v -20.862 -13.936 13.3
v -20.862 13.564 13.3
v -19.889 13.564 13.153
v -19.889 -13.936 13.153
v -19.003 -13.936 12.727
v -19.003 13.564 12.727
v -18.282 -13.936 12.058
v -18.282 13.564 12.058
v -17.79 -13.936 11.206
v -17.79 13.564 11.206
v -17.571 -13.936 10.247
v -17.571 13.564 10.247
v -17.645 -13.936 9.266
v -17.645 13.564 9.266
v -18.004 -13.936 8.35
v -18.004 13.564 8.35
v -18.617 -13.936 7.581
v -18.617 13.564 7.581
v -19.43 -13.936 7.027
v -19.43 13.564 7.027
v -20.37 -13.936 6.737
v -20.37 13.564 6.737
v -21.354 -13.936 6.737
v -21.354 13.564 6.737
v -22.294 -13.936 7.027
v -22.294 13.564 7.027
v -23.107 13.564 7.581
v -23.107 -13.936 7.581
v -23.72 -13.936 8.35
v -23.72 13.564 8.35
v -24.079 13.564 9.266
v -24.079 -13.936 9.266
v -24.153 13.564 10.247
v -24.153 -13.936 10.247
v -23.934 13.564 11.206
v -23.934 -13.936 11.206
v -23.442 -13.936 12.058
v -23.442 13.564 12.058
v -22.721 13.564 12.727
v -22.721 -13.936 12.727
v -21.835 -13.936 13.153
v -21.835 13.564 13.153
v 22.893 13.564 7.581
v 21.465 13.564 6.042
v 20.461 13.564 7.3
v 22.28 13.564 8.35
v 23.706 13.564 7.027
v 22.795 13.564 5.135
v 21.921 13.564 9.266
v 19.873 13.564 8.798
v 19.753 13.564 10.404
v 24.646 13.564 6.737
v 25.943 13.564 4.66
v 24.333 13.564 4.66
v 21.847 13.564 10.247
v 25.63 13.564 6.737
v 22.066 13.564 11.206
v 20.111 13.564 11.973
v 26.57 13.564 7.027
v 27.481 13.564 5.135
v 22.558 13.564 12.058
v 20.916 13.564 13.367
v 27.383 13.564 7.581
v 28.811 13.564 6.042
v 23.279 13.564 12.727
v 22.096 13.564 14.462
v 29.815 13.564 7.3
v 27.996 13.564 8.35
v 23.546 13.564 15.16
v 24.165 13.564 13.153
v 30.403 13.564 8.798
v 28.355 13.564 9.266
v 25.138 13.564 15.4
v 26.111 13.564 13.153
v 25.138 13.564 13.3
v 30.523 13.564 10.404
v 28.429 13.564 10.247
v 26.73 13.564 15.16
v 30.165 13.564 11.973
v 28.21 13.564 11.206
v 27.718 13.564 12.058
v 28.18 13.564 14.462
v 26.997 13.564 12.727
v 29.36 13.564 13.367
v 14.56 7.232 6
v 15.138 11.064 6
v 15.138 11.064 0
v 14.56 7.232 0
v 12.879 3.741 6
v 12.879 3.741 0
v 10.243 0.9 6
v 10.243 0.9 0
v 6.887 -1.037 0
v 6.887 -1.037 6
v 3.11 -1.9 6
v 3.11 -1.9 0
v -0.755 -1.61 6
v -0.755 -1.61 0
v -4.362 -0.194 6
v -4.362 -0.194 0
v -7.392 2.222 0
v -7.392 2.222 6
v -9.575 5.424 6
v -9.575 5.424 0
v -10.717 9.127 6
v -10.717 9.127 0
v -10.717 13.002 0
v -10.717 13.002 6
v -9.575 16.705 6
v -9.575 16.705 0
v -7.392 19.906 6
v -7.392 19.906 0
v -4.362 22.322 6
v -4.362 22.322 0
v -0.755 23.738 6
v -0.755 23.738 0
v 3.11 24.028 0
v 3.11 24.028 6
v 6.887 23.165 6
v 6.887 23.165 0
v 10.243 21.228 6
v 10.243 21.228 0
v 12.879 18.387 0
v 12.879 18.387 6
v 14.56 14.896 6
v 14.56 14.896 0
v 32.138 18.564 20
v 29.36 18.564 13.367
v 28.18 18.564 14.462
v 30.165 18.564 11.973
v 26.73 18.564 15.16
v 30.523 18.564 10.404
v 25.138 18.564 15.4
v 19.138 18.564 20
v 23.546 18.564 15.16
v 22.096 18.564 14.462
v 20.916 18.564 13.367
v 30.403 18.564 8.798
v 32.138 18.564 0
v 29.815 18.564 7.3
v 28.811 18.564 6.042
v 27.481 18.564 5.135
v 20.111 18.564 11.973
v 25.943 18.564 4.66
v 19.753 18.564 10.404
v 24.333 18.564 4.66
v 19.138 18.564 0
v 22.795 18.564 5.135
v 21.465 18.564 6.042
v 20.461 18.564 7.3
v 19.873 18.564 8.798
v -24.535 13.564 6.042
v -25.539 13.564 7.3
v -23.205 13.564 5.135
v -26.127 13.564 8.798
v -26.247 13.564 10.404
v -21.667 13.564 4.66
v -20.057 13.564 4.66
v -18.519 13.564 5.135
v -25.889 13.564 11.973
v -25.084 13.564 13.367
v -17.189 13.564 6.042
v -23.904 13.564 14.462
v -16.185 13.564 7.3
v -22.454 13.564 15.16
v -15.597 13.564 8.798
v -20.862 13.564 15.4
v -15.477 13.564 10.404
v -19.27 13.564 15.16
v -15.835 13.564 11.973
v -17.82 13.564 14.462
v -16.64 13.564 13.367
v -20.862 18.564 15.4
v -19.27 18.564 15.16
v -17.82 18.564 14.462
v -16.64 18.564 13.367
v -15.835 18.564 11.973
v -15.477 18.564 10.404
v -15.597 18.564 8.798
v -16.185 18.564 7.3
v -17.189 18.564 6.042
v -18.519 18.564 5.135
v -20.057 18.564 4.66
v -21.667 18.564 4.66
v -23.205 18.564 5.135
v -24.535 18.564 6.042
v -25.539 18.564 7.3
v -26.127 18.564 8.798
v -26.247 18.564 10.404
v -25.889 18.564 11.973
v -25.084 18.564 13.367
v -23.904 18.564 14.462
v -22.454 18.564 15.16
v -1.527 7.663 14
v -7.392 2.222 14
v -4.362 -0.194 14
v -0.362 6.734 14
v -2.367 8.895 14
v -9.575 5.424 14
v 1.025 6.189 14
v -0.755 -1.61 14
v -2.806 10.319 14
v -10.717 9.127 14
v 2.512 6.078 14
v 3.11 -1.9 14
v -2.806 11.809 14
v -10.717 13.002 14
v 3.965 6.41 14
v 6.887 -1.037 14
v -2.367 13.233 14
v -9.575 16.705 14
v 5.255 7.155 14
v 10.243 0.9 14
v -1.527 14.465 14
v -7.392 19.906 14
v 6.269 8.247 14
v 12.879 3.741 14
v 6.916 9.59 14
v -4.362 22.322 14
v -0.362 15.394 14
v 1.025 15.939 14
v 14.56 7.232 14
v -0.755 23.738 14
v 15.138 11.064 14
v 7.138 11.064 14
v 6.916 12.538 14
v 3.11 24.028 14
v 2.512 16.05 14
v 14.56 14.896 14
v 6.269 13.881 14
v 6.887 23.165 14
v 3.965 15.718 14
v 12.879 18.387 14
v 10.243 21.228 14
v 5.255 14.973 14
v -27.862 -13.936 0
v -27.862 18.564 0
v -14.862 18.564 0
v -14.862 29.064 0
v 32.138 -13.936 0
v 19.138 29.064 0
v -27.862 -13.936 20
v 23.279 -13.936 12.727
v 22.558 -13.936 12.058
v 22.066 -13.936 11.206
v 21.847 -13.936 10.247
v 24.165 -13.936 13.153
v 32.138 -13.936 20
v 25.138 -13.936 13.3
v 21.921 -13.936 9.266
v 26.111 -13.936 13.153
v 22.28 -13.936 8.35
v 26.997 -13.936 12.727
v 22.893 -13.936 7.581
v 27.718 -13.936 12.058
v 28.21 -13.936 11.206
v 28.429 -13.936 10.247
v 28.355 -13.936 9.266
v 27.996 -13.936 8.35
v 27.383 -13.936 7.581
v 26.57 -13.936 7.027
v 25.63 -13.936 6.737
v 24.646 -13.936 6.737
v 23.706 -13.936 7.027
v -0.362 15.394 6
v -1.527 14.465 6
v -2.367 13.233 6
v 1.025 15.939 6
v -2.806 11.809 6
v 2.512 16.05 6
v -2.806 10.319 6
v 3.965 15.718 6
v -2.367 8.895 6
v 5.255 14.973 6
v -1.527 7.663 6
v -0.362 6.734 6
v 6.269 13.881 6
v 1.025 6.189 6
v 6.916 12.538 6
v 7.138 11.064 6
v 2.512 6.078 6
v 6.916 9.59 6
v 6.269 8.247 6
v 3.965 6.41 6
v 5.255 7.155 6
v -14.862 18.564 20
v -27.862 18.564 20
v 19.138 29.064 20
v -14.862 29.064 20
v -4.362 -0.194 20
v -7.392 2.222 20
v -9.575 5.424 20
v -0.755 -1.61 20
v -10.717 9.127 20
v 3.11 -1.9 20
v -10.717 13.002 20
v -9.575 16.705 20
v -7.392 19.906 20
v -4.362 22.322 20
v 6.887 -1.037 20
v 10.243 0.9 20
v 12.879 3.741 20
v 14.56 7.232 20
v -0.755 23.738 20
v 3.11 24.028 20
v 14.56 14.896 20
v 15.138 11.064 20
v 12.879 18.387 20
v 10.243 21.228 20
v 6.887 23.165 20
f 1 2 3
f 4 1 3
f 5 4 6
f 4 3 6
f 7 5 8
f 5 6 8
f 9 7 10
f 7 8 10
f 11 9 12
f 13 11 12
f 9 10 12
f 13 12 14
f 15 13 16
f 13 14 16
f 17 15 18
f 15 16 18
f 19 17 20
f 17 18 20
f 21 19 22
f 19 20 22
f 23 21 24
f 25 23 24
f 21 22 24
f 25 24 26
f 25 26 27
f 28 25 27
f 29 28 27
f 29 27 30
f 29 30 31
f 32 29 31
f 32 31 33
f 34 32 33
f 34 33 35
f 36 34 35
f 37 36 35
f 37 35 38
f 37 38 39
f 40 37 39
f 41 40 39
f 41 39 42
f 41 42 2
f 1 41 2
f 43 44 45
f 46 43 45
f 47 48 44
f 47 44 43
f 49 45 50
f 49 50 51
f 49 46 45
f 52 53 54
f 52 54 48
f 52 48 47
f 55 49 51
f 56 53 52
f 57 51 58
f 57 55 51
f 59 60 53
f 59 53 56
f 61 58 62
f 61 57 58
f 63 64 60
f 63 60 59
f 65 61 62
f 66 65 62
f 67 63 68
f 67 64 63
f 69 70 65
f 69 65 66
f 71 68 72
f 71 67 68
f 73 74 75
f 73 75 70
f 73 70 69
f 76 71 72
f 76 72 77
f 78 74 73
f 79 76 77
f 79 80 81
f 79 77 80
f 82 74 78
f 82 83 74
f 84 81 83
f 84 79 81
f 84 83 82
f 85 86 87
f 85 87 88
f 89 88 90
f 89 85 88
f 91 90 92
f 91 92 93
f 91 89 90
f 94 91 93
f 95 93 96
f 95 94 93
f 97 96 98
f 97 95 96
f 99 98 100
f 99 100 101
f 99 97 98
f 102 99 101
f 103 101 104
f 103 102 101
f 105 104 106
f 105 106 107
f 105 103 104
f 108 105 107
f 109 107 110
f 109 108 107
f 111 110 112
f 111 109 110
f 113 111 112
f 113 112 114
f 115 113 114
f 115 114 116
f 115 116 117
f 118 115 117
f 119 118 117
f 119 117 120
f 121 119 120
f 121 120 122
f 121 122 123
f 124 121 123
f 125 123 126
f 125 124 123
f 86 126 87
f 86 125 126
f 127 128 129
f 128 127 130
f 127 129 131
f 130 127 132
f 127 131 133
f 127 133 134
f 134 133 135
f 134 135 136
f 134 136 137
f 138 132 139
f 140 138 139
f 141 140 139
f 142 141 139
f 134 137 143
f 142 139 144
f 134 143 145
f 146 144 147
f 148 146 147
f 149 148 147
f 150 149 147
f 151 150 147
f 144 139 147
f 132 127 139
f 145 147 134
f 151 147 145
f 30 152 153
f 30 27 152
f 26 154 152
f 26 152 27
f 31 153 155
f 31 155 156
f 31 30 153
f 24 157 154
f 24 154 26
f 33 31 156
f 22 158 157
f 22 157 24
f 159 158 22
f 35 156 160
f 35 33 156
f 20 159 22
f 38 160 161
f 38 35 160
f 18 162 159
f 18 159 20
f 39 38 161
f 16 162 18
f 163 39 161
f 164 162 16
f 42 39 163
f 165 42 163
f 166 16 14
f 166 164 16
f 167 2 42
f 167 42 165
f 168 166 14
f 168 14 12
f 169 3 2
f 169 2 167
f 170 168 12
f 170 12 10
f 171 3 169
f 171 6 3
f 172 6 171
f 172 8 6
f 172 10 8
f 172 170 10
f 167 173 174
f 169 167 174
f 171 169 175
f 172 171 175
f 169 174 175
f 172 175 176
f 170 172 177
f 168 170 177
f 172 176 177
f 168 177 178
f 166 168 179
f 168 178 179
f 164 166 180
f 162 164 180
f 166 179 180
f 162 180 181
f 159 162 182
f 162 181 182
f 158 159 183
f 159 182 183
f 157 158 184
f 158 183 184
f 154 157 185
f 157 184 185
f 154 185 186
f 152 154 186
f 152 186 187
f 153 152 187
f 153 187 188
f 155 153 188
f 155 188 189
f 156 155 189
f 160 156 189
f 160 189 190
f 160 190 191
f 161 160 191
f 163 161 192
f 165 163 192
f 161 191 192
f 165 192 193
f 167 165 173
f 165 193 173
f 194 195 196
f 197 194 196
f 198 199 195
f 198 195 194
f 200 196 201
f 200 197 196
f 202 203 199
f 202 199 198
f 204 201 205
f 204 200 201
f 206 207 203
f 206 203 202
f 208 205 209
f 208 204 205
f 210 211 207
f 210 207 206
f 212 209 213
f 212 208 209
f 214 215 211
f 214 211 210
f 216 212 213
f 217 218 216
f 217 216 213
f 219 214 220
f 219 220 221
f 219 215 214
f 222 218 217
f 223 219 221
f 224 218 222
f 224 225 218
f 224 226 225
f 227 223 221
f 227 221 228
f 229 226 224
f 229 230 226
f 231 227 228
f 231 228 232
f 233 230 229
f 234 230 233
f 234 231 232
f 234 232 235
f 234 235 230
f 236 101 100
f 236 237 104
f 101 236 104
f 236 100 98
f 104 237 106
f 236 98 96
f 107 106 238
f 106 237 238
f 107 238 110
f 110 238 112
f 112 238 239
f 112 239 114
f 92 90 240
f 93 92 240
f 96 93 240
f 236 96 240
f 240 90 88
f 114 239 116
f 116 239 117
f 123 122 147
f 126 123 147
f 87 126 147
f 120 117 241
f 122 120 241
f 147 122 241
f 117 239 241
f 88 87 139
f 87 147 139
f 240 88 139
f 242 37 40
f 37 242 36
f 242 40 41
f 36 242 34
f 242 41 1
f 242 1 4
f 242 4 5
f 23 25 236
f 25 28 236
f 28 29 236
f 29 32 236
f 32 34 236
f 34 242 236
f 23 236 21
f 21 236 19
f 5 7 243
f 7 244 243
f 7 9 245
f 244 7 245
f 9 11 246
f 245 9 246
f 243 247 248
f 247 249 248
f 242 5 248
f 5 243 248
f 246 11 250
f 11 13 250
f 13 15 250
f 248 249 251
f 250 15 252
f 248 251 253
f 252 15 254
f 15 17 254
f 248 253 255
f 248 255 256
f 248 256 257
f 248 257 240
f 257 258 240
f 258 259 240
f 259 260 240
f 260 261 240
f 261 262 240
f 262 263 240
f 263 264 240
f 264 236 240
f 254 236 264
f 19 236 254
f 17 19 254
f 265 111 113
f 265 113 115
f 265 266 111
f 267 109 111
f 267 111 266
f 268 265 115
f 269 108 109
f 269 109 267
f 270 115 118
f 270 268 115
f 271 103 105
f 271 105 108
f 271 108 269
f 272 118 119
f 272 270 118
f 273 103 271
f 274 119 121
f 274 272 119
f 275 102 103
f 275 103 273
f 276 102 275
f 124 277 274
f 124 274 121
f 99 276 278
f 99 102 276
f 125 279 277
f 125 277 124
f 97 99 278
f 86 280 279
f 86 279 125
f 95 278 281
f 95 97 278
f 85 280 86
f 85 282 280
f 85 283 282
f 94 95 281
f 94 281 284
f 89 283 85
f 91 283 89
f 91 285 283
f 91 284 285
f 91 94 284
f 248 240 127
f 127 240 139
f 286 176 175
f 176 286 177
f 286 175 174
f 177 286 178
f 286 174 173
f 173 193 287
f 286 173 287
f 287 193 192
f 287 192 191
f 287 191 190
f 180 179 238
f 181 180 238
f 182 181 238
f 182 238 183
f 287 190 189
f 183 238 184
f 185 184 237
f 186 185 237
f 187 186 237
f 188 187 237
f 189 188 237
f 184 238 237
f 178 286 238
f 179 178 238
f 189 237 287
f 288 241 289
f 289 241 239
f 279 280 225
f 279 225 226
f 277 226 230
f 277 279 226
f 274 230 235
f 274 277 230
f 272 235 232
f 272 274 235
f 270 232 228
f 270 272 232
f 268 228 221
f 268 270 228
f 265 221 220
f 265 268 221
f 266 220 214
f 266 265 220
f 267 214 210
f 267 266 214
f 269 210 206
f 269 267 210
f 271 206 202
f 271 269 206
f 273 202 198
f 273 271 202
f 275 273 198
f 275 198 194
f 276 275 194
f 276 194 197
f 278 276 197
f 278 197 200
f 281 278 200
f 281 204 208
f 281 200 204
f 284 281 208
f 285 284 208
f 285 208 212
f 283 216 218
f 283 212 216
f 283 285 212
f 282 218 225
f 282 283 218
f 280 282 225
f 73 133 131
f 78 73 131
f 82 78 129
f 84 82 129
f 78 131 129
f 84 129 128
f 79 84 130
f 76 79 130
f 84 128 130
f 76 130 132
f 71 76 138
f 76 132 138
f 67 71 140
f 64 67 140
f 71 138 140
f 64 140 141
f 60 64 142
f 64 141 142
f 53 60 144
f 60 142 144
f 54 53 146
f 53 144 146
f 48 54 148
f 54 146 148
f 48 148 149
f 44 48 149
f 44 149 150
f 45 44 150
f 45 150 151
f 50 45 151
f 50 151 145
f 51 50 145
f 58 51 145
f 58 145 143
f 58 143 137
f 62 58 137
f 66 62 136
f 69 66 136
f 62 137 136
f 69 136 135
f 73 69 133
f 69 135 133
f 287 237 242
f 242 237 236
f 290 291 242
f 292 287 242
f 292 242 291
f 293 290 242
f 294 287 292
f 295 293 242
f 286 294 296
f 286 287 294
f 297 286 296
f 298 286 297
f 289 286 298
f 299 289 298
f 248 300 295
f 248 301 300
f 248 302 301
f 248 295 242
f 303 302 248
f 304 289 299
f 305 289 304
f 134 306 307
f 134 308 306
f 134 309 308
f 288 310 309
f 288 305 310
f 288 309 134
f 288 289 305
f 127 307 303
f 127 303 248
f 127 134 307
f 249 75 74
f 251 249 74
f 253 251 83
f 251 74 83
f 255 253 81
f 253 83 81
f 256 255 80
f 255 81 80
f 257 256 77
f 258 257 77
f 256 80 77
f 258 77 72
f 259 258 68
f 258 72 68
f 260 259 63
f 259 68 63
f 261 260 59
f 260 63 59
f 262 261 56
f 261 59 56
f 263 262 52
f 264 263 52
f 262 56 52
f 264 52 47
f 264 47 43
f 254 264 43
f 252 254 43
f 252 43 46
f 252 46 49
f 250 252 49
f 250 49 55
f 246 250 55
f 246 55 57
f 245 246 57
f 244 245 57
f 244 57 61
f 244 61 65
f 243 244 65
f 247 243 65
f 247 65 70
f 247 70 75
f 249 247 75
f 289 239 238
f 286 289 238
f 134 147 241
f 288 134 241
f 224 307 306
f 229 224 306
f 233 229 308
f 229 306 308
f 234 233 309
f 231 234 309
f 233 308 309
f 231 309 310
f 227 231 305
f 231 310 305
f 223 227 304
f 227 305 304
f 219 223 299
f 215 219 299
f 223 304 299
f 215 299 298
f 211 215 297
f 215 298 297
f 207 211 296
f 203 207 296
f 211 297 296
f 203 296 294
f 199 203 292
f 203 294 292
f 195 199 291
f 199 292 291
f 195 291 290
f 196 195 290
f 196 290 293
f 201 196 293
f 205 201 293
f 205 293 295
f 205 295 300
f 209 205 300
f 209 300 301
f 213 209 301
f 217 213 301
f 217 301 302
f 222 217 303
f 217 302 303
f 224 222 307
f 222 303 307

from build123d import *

# Parameters (mm, degrees)
ESQUISSE1_R             = 5
BOSS_EXTRU_1_DEPTH      = 20
ENL_V_MAT_EXTRU_1_REACH = 51.891
ESQUISSE2_R             = 3.3
ESQUISSE3_R             = 5.4
ENL_V_MAT_EXTRU_2_DEPTH = 5
ESQUISSE4_R             = 13
ENL_V_MAT_EXTRU_3_DEPTH = 6
ENL_V_START             = -6
ESQUISSE5_R             = 13
ENL_V_MAT_EXTRU_4_DEPTH = 6


with BuildPart() as part:
    # Esquisse1 → Boss.-Extru.1 (new body)
    with BuildSketch(Plane.XY):
        Polygon((-27.861974124, -13.935926773), (32.138025876, -13.935926773), (32.138025876, 18.564073227), (19.138025876, 18.564073227), (19.138025876, 29.064073227), (-14.861974124, 29.064073227), (-14.861974124, 18.564073227), (-27.861974124, 18.564073227), align=None)
        with Locations((2.138025876, 11.064073227)):
            Circle(ESQUISSE1_R, mode=Mode.SUBTRACT)
    extrude(amount=BOSS_EXTRU_1_DEPTH)

    # Esquisse2 → Enlèv. mat.-Extru.1 (cut, up to next)
    with BuildSketch(Plane(origin=(0, 18.564073227, 0), x_dir=(1, 0, 0), z_dir=(0, 1, 0)), mode=Mode.PRIVATE) as enl_v_mat_extru_1_sk1:
        with Locations(Location((25.138025876, -10, 0), (0, 0, 270))):
            Circle(ESQUISSE2_R)
    enl_v_mat_extru_1_tool1 = extrude(enl_v_mat_extru_1_sk1.sketch, amount=-ENL_V_MAT_EXTRU_1_REACH, mode=Mode.PRIVATE) & part.part
    # Esquisse2 → Enlèv. mat.-Extru.1 (cut, up to next)
    with BuildSketch(Plane(origin=(0, 18.564073227, 0), x_dir=(1, 0, 0), z_dir=(0, 1, 0)), mode=Mode.PRIVATE) as enl_v_mat_extru_1_sk2:
        with Locations(Location((-20.861974124, -10, 0), (0, 0, 270))):
            Circle(ESQUISSE2_R)
    enl_v_mat_extru_1_tool2 = extrude(enl_v_mat_extru_1_sk2.sketch, amount=-ENL_V_MAT_EXTRU_1_REACH, mode=Mode.PRIVATE) & part.part
    add(enl_v_mat_extru_1_tool1.solids().sort_by_distance((25.138026, 18.564073, 10))[0], mode=Mode.SUBTRACT)
    add(enl_v_mat_extru_1_tool2.solids().sort_by_distance((-20.861974, 18.564073, 10))[0], mode=Mode.SUBTRACT)

    # Esquisse3 → Enlèv. mat.-Extru.2 (cut)
    with BuildSketch(Plane(origin=(0, 18.564073227, 0), x_dir=(1, 0, 0), z_dir=(0, 1, 0))):
        with Locations(Location((25.138025876, -10, 0), (0, 0, 270))):
            Circle(ESQUISSE3_R)
        with Locations(Location((-20.861974124, -10, 0), (0, 0, 270))):
            Circle(ESQUISSE3_R)
    extrude(amount=-ENL_V_MAT_EXTRU_2_DEPTH, mode=Mode.SUBTRACT)

    # Esquisse4 → Enlèv. mat.-Extru.3 (cut)
    with BuildSketch(Plane.XY.offset(20)):
        with Locations((2.138025876, 11.064073227)):
            Circle(ESQUISSE4_R)
    extrude(amount=-ENL_V_MAT_EXTRU_3_DEPTH, mode=Mode.SUBTRACT)

    # Esquisse5 → Enlèv. mat.-Extru.4 (cut)
    with BuildSketch(Plane(origin=(0, 0, 0), x_dir=(-1, 0, 0), z_dir=(0, 0, -1)).offset(ENL_V_START)):
        with Locations(Location((-2.138025876, 11.064073227, 0), (0, 0, 180))):
            Circle(ESQUISSE5_R)
    extrude(amount=ENL_V_MAT_EXTRU_4_DEPTH, mode=Mode.SUBTRACT)


solid = part.part
